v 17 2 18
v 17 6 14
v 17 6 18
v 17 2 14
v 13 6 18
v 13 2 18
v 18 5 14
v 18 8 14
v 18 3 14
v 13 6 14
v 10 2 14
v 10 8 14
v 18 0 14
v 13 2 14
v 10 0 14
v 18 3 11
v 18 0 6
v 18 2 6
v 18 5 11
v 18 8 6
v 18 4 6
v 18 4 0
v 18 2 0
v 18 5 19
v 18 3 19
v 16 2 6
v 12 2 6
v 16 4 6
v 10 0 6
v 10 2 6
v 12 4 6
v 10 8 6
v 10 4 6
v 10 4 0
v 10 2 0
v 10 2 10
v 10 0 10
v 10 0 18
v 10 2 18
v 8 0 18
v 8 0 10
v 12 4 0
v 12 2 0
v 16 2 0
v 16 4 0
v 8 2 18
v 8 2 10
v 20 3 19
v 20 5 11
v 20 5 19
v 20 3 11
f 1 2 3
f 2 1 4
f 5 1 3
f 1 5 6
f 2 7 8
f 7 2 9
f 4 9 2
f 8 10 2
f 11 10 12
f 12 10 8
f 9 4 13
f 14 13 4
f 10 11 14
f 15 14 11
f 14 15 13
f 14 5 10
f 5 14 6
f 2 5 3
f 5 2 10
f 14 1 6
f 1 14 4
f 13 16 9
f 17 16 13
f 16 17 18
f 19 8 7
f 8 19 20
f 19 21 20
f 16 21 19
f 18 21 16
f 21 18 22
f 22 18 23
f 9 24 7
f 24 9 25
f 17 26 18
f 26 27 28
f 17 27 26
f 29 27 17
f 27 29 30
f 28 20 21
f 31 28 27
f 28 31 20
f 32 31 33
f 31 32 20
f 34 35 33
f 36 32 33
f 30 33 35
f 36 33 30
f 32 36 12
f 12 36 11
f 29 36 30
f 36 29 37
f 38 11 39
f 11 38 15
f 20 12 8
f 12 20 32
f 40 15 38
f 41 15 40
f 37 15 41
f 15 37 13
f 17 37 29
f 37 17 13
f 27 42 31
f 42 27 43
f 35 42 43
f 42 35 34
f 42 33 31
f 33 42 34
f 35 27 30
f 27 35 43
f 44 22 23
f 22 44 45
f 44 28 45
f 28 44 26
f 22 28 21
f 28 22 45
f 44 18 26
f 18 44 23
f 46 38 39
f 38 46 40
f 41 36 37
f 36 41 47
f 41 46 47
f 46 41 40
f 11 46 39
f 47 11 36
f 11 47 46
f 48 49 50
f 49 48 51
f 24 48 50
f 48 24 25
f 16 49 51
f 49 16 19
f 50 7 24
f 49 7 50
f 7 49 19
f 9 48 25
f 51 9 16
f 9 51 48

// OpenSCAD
// file: ../../../shapes/minecraft/copper-golem/copper-golem.scad
module copperGolem(headRotation_z = 0,
                    rightArmRotation_x = 0)
{
    // Head
    translate([2, 2, 14])
    {
        color("orange")
        rotate ([0, 0, headRotation_z])
        translate ([1, 0])
        rotate([0, 0, -headRotation_z])
        cube([4, 4, 4], center=false);
    }

    // Body
    translate([0, 0, 6])
    {
        color("green")
        cube([8, 8, 8]);
    }

    // Legs
    translate([0, 2, 0])
    {
        color("pink")
        cube([2, 2, 8]);
    }

    translate([6, 2, 0])
    {
        color("pink")
        cube([2, 2, 8]);
    }

    // Arms
    translate([-2, 0, 10])
    {
        // left arm
        color("red")
        cube([2, 2, 8]);
    }

    translate([8, 3, 11])
    {
        // right arm
        color("red")
        rotate([rightArmRotation_x, 0, 0])
        cube([2, 2, 8]);
    }

    // Eyes
    translate([2, 2, 8])
    {
        color("white")
        cube([2, 2, 2]);
    }

    translate([4, 2, 8])
    {
        color("white")
        cube([2, 2, 2]);
    }
}
// main file
use <../../../shapes/minecraft/copper-golem/copper-golem.scad>

rotate ([0, 0, $t*360])

translate ([10, 0, 0])

// square(5, center=true);
copperGolem();



// animation settings:
//    FPS: 20
//    Steps: 100
